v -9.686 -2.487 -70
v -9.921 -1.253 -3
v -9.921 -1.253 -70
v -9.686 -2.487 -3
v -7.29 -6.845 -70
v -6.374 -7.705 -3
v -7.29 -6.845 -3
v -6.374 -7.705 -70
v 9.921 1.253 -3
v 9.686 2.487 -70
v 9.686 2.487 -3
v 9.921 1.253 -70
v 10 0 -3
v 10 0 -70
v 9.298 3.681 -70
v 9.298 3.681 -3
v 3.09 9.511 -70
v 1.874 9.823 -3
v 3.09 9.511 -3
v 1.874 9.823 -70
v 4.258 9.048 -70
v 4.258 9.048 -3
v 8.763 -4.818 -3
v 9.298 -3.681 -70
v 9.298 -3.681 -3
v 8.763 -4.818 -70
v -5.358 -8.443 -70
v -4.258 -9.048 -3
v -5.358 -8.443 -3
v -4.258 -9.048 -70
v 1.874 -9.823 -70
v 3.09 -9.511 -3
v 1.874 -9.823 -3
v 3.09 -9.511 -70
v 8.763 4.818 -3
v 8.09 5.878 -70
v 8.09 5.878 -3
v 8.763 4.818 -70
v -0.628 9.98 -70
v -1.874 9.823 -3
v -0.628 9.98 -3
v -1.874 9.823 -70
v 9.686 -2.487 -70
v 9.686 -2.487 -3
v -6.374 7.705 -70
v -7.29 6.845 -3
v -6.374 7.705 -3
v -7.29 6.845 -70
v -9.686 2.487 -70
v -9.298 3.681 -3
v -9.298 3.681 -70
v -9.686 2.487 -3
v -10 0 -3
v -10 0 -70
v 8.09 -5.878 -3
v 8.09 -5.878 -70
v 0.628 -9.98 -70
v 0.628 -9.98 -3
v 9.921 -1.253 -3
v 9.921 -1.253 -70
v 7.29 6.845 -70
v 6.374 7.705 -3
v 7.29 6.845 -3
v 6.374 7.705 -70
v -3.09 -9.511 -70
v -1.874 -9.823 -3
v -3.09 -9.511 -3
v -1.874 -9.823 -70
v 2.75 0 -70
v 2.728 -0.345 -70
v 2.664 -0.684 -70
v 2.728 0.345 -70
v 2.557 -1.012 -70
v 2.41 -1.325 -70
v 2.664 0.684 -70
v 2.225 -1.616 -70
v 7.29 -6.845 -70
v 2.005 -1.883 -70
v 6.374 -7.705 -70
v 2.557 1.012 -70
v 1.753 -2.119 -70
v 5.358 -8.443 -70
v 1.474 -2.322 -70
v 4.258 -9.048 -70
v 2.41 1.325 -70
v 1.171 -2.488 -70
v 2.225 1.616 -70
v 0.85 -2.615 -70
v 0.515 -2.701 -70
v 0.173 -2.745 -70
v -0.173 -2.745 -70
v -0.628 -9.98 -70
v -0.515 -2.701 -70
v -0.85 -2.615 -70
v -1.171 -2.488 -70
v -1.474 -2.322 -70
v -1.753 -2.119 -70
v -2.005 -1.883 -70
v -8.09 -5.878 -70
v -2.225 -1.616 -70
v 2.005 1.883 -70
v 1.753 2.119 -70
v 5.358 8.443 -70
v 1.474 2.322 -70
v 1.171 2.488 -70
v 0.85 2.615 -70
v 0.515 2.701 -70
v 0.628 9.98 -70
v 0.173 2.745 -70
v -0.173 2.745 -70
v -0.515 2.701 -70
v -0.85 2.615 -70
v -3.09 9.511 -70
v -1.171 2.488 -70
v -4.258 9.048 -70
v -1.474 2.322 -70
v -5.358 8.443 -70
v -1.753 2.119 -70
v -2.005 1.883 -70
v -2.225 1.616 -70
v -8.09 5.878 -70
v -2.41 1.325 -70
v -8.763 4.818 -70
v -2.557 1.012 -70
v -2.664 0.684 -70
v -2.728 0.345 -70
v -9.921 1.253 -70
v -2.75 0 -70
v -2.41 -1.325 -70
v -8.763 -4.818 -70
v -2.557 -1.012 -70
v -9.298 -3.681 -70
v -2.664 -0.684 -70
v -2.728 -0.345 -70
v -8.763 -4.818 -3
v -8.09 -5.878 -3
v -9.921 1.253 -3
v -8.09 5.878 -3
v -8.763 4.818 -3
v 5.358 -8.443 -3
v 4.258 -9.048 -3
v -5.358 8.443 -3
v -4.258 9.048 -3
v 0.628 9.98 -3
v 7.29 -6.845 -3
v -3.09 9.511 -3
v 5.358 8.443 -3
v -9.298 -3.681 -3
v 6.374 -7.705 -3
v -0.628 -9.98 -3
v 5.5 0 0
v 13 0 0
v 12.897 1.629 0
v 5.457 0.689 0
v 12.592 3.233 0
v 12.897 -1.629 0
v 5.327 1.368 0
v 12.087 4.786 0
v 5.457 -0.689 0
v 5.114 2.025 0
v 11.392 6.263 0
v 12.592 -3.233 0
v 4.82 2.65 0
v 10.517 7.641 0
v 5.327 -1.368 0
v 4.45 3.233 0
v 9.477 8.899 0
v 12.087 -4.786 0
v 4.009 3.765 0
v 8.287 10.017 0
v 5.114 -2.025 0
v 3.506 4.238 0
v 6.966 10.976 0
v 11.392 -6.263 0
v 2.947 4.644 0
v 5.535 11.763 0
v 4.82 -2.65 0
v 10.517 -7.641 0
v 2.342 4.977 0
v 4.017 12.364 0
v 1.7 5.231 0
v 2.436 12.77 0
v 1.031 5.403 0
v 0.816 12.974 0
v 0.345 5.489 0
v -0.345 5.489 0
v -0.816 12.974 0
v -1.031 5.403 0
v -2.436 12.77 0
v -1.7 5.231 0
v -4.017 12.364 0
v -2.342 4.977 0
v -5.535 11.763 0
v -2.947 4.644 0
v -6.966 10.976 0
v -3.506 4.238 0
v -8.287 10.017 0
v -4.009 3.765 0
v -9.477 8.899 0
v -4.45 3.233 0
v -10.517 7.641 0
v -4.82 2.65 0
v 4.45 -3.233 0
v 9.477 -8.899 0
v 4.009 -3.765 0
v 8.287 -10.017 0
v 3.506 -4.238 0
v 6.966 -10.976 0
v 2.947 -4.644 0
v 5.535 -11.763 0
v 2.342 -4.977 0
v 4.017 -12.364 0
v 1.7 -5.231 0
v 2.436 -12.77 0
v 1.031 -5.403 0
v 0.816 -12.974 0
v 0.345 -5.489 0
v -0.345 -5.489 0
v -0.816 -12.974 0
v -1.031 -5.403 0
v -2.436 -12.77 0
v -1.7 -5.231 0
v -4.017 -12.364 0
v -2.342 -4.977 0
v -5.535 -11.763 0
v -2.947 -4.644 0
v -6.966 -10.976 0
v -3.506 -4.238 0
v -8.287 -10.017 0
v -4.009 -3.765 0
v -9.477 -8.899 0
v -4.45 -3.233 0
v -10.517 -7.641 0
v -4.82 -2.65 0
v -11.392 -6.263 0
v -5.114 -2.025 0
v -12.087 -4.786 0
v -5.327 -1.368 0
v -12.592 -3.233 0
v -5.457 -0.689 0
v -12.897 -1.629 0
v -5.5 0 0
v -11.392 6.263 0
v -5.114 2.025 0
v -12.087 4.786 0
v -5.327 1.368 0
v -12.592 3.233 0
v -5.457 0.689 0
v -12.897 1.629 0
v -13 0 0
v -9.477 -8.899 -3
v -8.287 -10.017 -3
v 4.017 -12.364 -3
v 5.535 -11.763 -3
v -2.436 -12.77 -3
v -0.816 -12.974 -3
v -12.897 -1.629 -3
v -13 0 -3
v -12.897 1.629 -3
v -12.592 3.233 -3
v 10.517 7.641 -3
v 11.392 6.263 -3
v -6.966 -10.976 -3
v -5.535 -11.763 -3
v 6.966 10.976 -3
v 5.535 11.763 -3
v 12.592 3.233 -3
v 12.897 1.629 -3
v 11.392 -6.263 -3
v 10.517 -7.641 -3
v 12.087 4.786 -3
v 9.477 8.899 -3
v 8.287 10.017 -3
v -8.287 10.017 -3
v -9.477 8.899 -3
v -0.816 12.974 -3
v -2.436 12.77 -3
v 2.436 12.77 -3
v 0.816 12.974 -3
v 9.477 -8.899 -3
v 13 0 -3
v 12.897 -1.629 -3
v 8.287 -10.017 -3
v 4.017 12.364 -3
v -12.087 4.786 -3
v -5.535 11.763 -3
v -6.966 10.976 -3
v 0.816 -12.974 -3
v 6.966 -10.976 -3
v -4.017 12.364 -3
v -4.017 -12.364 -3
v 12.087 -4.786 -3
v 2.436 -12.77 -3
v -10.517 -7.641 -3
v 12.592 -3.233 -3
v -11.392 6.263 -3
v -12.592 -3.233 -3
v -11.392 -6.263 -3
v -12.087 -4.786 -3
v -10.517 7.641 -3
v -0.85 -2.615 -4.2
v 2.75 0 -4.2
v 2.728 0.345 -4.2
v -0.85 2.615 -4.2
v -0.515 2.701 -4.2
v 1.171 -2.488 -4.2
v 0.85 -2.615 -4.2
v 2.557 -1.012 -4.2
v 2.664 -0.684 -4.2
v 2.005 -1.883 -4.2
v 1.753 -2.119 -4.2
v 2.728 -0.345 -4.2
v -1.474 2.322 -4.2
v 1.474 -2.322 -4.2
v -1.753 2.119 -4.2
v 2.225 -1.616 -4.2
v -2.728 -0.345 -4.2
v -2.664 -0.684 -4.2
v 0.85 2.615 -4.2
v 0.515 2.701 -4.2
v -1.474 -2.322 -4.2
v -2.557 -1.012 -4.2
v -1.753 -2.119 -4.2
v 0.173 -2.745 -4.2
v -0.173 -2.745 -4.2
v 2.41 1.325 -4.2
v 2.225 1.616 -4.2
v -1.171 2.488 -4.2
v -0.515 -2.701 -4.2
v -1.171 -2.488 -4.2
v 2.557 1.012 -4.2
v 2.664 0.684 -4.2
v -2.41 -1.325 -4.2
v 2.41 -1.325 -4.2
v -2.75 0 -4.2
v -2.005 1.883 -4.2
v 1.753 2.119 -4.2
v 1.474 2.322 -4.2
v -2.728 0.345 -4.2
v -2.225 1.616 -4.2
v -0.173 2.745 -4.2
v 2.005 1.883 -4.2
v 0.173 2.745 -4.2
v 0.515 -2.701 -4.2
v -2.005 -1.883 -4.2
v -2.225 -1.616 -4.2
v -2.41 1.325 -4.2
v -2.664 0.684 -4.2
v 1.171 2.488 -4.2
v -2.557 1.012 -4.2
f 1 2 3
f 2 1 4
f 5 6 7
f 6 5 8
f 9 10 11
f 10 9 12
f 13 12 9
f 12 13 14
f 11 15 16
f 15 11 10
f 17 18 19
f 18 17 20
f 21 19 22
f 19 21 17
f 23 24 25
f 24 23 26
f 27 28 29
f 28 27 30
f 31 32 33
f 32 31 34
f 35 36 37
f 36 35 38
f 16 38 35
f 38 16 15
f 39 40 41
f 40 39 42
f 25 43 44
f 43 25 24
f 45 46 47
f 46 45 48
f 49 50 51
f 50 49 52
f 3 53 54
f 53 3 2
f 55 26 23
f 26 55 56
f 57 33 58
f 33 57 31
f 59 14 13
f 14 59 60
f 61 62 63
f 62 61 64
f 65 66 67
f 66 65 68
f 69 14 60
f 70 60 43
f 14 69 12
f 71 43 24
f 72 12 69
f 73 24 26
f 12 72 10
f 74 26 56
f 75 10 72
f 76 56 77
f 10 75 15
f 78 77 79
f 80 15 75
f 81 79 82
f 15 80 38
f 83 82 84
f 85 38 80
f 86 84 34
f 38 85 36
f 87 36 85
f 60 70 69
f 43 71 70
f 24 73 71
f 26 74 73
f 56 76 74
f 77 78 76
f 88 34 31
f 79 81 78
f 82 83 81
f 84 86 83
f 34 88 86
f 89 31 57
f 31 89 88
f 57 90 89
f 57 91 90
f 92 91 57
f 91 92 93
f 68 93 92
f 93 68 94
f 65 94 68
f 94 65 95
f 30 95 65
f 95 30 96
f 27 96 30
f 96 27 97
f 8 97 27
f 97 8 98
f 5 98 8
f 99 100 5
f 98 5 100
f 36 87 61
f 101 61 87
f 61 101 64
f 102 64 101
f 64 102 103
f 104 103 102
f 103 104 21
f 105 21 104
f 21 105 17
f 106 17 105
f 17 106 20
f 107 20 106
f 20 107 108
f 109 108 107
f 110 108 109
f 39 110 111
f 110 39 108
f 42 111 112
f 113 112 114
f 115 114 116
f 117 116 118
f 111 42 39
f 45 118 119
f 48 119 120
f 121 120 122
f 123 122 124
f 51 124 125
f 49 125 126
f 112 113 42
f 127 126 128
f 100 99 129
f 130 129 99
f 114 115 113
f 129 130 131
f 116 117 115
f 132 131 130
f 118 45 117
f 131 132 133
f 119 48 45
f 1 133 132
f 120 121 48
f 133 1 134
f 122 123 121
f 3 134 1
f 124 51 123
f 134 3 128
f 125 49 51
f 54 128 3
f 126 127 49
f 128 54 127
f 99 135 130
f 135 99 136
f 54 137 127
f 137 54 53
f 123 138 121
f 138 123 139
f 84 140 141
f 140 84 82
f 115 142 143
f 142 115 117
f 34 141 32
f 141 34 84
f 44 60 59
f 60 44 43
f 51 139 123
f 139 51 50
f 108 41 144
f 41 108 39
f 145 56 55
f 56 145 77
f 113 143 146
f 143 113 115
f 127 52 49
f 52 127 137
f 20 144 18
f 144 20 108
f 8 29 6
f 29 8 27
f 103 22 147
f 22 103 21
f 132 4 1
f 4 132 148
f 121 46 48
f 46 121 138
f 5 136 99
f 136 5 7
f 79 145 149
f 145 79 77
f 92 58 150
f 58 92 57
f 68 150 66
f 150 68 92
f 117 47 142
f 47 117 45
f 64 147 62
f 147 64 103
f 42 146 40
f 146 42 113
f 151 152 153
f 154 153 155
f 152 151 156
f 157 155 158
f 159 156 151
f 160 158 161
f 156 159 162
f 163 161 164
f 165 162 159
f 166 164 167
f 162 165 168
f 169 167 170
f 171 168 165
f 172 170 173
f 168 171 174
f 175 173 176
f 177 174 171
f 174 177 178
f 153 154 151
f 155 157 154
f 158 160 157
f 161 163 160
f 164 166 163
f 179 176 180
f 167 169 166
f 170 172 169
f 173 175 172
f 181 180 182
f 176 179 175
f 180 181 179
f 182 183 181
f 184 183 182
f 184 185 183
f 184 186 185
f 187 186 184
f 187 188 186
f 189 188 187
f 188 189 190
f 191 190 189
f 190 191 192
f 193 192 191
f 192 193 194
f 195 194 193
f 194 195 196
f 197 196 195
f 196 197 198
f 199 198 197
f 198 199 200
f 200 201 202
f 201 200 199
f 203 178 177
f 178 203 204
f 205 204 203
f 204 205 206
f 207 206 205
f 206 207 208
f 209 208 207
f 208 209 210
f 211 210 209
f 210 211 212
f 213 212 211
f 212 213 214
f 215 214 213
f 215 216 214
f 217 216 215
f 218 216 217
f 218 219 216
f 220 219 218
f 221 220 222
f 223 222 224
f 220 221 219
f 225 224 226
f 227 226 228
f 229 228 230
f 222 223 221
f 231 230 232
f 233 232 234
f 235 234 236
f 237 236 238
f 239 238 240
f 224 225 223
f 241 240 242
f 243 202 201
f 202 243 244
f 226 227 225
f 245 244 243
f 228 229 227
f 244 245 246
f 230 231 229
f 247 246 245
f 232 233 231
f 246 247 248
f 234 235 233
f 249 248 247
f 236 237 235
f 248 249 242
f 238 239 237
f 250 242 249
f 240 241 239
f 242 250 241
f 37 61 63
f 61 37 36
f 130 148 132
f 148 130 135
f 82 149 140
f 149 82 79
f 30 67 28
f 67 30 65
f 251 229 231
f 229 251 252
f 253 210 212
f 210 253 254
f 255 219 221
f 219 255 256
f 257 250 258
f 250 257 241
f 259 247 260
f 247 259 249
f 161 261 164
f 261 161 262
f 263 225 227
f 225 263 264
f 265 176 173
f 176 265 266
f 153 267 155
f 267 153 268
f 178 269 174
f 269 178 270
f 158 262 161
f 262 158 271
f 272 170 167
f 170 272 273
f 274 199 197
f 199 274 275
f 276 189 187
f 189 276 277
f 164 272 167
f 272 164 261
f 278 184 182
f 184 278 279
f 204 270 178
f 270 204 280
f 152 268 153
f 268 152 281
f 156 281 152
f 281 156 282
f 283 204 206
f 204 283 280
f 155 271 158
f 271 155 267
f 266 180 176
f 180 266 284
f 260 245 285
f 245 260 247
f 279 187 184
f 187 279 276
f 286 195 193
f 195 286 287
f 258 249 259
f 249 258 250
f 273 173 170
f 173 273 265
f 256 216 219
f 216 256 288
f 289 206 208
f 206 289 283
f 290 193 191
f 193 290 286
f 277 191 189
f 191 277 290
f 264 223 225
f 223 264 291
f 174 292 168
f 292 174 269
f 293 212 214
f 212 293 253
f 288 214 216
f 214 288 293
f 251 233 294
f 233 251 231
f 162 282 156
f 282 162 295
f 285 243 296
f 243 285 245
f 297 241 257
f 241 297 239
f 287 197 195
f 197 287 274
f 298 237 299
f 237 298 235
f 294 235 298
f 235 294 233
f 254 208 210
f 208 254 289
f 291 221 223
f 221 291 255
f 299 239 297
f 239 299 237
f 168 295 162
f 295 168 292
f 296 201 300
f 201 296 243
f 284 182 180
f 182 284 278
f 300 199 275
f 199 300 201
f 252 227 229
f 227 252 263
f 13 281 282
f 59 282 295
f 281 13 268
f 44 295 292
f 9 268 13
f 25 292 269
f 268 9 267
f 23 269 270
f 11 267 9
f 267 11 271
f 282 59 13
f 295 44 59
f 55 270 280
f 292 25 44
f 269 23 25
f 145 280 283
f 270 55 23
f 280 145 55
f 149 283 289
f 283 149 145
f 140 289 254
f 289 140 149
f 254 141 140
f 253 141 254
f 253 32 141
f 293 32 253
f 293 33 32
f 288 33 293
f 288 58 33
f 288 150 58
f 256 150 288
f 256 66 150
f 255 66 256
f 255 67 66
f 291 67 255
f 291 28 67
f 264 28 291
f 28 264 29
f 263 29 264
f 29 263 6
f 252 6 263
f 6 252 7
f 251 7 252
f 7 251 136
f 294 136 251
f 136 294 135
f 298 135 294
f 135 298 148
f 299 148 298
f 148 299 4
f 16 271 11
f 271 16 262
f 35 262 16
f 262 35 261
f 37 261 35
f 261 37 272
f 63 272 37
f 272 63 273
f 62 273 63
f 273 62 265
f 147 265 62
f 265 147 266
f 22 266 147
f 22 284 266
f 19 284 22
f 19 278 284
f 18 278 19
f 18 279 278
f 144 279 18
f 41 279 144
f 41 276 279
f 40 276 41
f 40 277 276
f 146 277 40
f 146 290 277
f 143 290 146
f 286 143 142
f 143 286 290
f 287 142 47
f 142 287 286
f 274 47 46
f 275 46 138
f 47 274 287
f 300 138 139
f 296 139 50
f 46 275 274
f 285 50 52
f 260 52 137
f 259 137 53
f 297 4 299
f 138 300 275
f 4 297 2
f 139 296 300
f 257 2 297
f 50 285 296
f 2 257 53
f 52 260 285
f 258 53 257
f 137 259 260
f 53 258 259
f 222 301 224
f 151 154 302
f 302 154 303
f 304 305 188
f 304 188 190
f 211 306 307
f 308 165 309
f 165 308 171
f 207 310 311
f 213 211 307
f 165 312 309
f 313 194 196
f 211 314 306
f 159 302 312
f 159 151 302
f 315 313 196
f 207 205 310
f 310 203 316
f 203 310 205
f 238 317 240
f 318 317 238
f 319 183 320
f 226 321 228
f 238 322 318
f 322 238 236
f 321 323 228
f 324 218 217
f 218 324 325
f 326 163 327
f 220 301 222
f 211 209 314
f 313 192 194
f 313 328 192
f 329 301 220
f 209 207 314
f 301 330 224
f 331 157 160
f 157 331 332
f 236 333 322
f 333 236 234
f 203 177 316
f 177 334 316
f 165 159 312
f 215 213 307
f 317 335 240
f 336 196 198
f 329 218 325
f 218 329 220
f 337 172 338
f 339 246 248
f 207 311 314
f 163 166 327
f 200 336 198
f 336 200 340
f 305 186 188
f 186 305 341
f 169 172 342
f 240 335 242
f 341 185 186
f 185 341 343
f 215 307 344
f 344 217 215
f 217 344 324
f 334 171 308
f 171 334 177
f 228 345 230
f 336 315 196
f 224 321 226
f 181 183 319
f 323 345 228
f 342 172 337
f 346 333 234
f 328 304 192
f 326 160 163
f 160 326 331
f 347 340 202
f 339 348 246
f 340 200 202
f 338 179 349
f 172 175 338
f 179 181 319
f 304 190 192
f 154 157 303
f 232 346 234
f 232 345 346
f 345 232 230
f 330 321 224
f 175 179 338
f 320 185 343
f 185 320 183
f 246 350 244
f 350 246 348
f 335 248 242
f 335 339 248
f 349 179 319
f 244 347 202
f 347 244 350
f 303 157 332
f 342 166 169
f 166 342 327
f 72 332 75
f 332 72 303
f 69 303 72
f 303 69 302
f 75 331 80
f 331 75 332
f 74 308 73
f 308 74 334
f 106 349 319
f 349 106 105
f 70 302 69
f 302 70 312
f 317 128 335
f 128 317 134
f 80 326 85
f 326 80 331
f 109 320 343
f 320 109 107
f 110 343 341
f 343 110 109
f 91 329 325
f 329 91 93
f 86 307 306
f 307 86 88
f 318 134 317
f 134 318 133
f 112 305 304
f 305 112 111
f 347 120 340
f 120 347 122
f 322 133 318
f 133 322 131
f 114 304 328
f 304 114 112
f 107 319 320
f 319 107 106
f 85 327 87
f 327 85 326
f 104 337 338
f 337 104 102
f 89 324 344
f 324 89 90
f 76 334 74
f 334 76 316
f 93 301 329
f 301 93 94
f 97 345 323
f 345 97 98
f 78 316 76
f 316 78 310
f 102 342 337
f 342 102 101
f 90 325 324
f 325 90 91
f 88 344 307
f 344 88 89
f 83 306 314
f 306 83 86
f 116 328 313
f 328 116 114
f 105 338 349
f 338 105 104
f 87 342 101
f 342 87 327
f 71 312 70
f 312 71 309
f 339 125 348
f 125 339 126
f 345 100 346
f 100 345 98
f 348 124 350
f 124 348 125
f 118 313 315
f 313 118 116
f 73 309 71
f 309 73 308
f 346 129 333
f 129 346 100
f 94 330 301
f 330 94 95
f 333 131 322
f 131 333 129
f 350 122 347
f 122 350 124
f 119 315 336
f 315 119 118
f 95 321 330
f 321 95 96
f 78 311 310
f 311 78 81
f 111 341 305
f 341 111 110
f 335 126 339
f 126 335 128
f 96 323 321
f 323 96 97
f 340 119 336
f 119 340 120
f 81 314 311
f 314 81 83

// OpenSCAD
$fn = 50;


difference() {
	union() {
		translate(v = [0, 0, -70.0000000000]) {
			cylinder(h = 70, r = 10.0000000000);
		}
		translate(v = [0, 0, -3.0000000000]) {
			cylinder(h = 3, r = 13.0000000000);
		}
	}
	union() {
		translate(v = [0, 0, 0]) {
			rotate(a = [0, 0, 0]) {
				difference() {
					union() {
						#translate(v = [0, 0, -70.0000000000]) {
							cylinder(h = 70, r = 2.2500000000);
						}
						#translate(v = [0, 0, -4.2000000000]) {
							cylinder(h = 4.2000000000, r = 10.0000000000, r1 = 2.7500000000, r2 = 5.5000000000);
						}
						#translate(v = [0, 0, -70.0000000000]) {
							cylinder(h = 70, r = 2.7500000000);
						}
						#translate(v = [0, 0, -70.0000000000]) {
							cylinder(h = 70, r = 2.2500000000);
						}
					}
					union();
				}
			}
		}
	}
}
